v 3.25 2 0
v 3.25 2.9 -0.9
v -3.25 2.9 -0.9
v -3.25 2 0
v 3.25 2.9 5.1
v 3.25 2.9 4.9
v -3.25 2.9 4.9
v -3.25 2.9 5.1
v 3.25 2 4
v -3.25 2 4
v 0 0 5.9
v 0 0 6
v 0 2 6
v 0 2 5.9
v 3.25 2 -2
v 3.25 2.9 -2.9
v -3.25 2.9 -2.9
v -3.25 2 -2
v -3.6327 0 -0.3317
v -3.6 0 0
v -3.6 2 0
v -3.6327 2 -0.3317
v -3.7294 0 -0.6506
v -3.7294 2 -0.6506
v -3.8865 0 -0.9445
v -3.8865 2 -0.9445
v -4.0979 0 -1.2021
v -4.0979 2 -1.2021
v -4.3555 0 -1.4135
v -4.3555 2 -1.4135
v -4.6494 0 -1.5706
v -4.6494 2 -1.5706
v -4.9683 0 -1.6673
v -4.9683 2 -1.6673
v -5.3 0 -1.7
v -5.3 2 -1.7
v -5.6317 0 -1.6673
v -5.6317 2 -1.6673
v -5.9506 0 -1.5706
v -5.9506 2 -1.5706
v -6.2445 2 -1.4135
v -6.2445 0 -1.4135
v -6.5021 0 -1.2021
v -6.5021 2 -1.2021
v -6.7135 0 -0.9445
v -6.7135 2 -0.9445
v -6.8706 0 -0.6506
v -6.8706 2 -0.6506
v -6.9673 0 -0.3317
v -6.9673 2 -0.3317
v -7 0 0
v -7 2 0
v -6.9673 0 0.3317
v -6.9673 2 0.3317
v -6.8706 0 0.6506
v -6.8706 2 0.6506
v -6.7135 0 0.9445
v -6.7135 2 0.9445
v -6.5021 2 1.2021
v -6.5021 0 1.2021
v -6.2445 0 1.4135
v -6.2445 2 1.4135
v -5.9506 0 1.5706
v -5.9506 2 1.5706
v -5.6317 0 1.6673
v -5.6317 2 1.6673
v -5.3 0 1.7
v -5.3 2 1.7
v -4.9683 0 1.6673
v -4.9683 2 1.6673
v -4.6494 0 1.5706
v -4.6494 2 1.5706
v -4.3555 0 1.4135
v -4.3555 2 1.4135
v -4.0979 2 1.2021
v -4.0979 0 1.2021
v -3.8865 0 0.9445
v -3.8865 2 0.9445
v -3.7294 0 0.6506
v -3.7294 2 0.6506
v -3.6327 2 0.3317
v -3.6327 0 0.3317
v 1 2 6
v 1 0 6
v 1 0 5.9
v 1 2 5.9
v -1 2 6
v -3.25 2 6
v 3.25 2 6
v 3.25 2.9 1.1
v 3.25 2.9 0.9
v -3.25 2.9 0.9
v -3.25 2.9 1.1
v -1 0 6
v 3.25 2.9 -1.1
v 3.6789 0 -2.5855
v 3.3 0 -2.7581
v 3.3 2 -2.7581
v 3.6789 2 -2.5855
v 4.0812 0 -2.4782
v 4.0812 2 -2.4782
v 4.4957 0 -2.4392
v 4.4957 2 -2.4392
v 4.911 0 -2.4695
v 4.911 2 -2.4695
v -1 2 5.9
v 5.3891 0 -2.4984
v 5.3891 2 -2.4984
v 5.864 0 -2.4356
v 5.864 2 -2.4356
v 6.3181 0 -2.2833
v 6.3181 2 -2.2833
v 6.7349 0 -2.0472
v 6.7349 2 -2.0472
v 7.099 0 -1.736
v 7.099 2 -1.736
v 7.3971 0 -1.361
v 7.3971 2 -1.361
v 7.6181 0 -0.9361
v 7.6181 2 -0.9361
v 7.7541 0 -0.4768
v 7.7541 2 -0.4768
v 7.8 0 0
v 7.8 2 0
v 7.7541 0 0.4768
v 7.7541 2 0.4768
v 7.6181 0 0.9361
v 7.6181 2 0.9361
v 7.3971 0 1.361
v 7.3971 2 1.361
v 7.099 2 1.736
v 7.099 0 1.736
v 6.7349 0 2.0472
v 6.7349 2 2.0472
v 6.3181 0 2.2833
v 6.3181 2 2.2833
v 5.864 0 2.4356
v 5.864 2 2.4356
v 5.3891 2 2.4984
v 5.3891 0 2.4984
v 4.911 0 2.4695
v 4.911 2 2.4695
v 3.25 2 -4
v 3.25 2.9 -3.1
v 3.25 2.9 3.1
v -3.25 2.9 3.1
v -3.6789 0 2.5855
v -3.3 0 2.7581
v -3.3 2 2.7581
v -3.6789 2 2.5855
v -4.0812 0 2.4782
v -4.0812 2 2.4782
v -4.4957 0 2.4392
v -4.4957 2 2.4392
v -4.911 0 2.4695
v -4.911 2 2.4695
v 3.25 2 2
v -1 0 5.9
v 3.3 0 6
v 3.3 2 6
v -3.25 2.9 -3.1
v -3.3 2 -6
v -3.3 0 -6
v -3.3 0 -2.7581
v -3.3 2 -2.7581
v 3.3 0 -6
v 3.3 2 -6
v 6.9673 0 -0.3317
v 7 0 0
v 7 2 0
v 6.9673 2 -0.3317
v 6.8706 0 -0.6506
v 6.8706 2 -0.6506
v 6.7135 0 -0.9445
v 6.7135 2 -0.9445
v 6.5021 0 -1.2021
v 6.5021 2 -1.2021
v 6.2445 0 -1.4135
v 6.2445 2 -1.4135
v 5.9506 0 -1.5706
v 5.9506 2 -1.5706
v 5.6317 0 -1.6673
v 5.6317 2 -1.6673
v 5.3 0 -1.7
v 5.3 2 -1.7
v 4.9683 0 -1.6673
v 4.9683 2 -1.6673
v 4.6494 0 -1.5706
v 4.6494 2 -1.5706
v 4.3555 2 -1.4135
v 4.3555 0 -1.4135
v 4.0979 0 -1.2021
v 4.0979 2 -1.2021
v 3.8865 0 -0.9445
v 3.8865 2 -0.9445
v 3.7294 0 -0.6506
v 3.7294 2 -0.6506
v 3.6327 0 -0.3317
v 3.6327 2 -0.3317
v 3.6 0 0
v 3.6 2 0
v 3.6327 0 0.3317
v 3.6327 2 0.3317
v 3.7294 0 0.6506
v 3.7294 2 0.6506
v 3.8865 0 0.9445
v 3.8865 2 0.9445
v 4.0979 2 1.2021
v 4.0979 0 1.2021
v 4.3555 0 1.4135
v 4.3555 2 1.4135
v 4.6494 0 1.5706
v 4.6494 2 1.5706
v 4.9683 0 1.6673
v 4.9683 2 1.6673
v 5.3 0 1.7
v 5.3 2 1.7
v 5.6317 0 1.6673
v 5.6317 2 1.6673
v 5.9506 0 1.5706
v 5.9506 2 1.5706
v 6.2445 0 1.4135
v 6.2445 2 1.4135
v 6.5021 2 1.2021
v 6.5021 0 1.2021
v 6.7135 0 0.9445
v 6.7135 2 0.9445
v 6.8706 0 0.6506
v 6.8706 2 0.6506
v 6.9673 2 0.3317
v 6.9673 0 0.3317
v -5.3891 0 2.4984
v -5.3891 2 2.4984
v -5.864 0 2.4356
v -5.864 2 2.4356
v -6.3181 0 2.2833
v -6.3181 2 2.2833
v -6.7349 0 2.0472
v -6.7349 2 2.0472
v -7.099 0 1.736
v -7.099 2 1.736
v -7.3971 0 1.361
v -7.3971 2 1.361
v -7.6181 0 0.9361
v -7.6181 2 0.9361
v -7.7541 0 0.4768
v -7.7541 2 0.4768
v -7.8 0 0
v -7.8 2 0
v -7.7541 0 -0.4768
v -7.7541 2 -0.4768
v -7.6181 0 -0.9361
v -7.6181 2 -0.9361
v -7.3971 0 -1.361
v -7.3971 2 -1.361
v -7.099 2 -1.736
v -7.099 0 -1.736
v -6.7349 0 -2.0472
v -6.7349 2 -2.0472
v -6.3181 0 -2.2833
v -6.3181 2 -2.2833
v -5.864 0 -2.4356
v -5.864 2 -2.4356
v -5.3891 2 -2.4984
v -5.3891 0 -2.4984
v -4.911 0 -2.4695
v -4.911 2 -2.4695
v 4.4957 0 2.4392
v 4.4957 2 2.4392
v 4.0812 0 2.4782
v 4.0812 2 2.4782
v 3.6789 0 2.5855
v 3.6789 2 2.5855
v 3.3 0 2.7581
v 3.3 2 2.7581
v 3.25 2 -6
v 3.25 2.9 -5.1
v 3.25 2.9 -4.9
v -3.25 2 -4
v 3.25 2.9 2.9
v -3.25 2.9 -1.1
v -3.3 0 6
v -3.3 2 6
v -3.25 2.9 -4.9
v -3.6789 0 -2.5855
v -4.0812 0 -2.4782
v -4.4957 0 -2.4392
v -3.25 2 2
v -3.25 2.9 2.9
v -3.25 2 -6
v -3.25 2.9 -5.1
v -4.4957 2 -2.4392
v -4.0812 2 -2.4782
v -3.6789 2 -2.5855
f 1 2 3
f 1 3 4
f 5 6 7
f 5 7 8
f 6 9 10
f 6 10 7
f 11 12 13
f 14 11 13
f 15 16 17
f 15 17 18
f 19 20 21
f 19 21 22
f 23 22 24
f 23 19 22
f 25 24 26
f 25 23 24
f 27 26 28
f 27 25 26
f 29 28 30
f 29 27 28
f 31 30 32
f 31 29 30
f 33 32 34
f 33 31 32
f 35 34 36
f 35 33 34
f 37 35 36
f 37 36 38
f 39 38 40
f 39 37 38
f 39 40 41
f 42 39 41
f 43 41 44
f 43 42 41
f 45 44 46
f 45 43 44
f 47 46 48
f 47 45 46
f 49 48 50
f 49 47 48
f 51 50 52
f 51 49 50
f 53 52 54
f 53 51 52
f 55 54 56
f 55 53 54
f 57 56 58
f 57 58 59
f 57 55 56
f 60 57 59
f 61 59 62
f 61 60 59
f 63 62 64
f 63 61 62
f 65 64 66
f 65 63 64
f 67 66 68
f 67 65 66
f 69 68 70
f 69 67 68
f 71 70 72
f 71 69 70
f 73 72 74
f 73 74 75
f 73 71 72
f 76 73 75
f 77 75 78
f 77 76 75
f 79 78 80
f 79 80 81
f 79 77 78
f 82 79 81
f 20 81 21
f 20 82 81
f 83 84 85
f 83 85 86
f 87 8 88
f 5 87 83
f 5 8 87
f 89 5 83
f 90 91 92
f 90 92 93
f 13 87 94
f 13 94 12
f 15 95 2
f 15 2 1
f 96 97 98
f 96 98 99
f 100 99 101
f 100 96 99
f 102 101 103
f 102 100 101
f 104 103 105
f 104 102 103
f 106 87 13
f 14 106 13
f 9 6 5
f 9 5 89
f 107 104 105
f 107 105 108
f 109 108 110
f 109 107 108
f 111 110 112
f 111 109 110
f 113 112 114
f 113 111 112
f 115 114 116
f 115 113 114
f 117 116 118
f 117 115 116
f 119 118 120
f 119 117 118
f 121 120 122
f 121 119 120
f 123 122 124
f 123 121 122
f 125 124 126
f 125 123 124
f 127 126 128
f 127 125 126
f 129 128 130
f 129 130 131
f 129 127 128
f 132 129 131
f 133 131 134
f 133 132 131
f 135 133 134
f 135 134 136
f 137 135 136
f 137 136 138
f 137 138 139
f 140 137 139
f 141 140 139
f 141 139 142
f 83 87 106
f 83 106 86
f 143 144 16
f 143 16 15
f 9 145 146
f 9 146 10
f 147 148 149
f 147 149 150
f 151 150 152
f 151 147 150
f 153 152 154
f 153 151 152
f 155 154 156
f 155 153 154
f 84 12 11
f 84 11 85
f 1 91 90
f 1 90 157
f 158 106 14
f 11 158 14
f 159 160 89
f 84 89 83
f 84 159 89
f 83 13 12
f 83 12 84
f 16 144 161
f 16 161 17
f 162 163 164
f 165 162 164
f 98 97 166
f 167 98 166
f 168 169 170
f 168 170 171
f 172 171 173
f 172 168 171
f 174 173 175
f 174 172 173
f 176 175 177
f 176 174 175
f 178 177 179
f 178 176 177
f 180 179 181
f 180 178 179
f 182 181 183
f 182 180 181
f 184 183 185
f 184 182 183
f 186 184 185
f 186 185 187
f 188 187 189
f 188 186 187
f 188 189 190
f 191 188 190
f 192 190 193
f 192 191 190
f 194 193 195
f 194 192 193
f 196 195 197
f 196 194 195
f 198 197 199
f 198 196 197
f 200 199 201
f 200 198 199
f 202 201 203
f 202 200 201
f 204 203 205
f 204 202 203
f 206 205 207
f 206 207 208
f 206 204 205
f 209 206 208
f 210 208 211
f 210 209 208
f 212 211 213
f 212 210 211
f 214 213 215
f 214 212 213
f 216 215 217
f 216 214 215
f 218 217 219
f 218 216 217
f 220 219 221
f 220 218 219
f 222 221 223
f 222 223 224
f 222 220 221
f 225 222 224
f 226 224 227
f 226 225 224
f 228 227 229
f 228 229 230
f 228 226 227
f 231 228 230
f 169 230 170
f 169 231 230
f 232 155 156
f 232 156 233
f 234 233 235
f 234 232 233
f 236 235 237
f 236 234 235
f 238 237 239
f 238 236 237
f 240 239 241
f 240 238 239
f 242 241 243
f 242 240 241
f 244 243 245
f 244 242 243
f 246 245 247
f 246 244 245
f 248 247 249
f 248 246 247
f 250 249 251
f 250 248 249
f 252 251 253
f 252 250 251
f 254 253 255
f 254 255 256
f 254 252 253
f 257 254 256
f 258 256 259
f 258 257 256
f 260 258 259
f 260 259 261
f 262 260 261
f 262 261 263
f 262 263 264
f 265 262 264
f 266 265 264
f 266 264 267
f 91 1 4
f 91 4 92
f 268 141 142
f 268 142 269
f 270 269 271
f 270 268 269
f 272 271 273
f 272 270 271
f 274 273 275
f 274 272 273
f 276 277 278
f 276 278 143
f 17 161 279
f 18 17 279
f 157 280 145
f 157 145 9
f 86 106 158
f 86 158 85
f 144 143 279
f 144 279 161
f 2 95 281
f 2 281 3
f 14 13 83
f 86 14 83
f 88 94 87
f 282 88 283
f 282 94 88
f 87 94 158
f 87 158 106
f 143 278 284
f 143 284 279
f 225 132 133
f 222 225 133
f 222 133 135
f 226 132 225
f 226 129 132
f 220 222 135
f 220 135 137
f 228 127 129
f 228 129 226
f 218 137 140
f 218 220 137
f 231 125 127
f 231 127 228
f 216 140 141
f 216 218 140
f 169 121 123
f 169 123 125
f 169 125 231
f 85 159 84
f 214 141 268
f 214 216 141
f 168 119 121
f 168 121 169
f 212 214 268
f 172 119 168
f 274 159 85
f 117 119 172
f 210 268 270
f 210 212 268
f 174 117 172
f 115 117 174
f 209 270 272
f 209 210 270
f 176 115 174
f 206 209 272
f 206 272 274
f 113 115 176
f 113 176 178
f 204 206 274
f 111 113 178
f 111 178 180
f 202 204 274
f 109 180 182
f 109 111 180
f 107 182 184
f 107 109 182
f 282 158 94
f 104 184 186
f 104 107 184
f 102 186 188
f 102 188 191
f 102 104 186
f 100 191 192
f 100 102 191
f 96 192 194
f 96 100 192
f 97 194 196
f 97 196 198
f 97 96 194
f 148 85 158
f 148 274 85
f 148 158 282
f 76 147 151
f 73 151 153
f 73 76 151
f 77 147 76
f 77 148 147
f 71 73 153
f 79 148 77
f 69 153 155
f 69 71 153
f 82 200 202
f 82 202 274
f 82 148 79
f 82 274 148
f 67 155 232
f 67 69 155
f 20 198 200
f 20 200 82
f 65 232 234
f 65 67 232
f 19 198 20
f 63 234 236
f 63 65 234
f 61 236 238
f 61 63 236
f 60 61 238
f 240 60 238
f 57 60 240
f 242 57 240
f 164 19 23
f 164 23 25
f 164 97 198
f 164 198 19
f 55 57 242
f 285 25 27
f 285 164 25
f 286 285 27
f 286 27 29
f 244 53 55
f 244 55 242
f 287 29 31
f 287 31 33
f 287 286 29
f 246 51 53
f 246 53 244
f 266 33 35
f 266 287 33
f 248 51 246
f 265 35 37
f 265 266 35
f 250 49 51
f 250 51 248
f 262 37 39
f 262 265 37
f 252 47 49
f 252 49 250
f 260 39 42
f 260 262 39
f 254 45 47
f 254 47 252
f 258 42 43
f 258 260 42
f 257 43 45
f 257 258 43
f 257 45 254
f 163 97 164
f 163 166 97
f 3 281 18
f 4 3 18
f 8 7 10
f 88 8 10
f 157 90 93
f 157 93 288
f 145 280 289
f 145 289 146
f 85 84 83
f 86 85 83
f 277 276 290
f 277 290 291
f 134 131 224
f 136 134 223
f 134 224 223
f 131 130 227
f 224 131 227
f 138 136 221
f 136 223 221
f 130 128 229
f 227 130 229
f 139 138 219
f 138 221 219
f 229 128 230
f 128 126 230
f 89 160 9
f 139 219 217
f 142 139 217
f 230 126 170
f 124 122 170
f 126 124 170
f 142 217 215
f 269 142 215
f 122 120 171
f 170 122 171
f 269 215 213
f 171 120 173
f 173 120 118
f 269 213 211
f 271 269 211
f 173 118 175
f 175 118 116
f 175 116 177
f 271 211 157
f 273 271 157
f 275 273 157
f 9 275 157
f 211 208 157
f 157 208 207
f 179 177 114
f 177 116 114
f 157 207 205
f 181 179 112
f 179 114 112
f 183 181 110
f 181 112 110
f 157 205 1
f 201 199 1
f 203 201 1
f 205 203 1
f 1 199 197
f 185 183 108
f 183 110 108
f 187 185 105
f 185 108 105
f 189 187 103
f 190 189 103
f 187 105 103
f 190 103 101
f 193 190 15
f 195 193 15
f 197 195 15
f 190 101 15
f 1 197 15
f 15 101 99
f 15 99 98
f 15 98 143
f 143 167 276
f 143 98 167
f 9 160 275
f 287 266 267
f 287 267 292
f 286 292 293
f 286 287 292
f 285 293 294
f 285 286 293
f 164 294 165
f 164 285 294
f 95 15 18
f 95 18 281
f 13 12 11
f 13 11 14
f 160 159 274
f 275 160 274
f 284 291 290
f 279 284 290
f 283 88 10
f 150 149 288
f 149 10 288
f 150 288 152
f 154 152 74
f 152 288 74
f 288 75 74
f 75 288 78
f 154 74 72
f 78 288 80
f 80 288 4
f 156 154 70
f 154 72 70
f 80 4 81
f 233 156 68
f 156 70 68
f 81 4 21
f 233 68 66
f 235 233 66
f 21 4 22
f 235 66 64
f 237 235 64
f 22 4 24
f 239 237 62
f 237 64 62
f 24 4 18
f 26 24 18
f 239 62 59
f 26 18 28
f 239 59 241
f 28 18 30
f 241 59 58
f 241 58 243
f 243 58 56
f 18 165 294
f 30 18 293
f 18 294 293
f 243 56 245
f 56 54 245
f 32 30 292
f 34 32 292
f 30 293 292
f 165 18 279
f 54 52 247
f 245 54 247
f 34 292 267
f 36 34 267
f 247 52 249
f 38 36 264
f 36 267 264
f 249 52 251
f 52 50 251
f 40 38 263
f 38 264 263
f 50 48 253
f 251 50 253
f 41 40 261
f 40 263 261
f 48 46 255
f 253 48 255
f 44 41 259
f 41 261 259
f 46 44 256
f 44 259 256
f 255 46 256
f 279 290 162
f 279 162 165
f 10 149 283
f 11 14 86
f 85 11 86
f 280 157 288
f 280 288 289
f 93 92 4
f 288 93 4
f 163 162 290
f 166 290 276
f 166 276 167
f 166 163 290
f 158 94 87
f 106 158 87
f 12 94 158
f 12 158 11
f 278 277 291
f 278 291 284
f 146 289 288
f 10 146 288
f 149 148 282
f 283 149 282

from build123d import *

# Parameters (mm, degrees)
CROQUIS1_R              = 1.7
SALIENTE_EXTRUIR1_DEPTH = 2
SALIENTE_EXTRUIR2_DEPTH = 6.5
MATRIZL1_COUNT          = 6
MATRIZL1_PITCH          = 2
SKETCH1_W               = 2
SKETCH1_H               = 2
CUT_EXTRUDE1_DEPTH      = 0.1
SKETCH1_3_W             = 1
SKETCH1_3_H             = 2
BOSS_EXTRUDE1_DEPTH     = 0.1
SKETCH1_4_W             = 1
SKETCH1_4_H             = 2
BOSS_EXTRUDE2_DEPTH     = 0.1


with BuildPart() as part:
    # Croquis1 → Saliente-Extruir1 (new body)
    with BuildSketch(Plane(origin=(0, 0, 0), x_dir=(1, 0, 0), z_dir=(0, 1, 0))):
        with BuildLine():
            Line((3.3, 6), (-3.3, 6))
            Line((-3.3, 6), (-3.3, 2.758060528))
            ThreePointArc((-3.3, 2.758060528), (-4.081204524, 2.478243977), (-4.910964812, 2.469544821))
            ThreePointArc((-4.910964812, 2.469544821), (-7.8, 0), (-4.910964812, -2.469544821))
            ThreePointArc((-4.910964812, -2.469544821), (-4.081204524, -2.478243977), (-3.3, -2.758060528))
            Line((-3.3, -2.758060528), (-3.3, -6))
            Line((-3.3, -6), (3.3, -6))
            Line((3.3, -6), (3.3, -2.758060528))
            ThreePointArc((3.3, -2.758060528), (4.081204524, -2.478243977), (4.910964812, -2.469544821))
            ThreePointArc((4.910964812, -2.469544821), (7.8, 0), (4.910964812, 2.469544821))
            ThreePointArc((4.910964812, 2.469544821), (4.081204524, 2.478243977), (3.3, 2.758060528))
            Line((3.3, 2.758060528), (3.3, 6))
        make_face()
        with Locations((5.3, 0)):
            Circle(CROQUIS1_R, mode=Mode.SUBTRACT)
        with Locations((-5.3, 0)):
            Circle(CROQUIS1_R, mode=Mode.SUBTRACT)
    extrude(amount=SALIENTE_EXTRUIR1_DEPTH)

    # Croquis4 → Saliente-Extruir2 (add)
    with BuildSketch(Plane(origin=(3.25, 0, 0), x_dir=(0, 0, -1), z_dir=(1, 0, 0))):
        Polygon((-6, 2), (-4, 2), (-4.9, 2.9), (-5.1, 2.9), align=None)
    saliente_extruir2 = extrude(amount=-SALIENTE_EXTRUIR2_DEPTH)

    # MatrizL1: Saliente-Extruir2 ×6
    with Locations(*[(0, 0, -i * MATRIZL1_PITCH) for i in range(1, MATRIZL1_COUNT)]):
        add(saliente_extruir2)

    # Sketch1 → Cut-Extrude1 (cut)
    with BuildSketch(Plane.XY.offset(6)):
        with Locations((0, 1)):
            Rectangle(SKETCH1_W, SKETCH1_H)
    extrude(amount=-CUT_EXTRUDE1_DEPTH, mode=Mode.SUBTRACT)


with BuildPart() as body_2:
    # Sketch1<3> → Boss-Extrude1 (new body)
    with BuildSketch(Plane.XY.offset(6)):
        with Locations((0.5, 1)):
            Rectangle(SKETCH1_3_W, SKETCH1_3_H)
    extrude(amount=-BOSS_EXTRUDE1_DEPTH)


with BuildPart() as body_3:
    # Sketch1<4> → Boss-Extrude2 (new body)
    with BuildSketch(Plane.XY.offset(6)):
        with Locations((-0.5, 1)):
            Rectangle(SKETCH1_4_W, SKETCH1_4_H)
    extrude(amount=-BOSS_EXTRUDE2_DEPTH)


solid = Compound([part.part, body_2.part, body_3.part])
